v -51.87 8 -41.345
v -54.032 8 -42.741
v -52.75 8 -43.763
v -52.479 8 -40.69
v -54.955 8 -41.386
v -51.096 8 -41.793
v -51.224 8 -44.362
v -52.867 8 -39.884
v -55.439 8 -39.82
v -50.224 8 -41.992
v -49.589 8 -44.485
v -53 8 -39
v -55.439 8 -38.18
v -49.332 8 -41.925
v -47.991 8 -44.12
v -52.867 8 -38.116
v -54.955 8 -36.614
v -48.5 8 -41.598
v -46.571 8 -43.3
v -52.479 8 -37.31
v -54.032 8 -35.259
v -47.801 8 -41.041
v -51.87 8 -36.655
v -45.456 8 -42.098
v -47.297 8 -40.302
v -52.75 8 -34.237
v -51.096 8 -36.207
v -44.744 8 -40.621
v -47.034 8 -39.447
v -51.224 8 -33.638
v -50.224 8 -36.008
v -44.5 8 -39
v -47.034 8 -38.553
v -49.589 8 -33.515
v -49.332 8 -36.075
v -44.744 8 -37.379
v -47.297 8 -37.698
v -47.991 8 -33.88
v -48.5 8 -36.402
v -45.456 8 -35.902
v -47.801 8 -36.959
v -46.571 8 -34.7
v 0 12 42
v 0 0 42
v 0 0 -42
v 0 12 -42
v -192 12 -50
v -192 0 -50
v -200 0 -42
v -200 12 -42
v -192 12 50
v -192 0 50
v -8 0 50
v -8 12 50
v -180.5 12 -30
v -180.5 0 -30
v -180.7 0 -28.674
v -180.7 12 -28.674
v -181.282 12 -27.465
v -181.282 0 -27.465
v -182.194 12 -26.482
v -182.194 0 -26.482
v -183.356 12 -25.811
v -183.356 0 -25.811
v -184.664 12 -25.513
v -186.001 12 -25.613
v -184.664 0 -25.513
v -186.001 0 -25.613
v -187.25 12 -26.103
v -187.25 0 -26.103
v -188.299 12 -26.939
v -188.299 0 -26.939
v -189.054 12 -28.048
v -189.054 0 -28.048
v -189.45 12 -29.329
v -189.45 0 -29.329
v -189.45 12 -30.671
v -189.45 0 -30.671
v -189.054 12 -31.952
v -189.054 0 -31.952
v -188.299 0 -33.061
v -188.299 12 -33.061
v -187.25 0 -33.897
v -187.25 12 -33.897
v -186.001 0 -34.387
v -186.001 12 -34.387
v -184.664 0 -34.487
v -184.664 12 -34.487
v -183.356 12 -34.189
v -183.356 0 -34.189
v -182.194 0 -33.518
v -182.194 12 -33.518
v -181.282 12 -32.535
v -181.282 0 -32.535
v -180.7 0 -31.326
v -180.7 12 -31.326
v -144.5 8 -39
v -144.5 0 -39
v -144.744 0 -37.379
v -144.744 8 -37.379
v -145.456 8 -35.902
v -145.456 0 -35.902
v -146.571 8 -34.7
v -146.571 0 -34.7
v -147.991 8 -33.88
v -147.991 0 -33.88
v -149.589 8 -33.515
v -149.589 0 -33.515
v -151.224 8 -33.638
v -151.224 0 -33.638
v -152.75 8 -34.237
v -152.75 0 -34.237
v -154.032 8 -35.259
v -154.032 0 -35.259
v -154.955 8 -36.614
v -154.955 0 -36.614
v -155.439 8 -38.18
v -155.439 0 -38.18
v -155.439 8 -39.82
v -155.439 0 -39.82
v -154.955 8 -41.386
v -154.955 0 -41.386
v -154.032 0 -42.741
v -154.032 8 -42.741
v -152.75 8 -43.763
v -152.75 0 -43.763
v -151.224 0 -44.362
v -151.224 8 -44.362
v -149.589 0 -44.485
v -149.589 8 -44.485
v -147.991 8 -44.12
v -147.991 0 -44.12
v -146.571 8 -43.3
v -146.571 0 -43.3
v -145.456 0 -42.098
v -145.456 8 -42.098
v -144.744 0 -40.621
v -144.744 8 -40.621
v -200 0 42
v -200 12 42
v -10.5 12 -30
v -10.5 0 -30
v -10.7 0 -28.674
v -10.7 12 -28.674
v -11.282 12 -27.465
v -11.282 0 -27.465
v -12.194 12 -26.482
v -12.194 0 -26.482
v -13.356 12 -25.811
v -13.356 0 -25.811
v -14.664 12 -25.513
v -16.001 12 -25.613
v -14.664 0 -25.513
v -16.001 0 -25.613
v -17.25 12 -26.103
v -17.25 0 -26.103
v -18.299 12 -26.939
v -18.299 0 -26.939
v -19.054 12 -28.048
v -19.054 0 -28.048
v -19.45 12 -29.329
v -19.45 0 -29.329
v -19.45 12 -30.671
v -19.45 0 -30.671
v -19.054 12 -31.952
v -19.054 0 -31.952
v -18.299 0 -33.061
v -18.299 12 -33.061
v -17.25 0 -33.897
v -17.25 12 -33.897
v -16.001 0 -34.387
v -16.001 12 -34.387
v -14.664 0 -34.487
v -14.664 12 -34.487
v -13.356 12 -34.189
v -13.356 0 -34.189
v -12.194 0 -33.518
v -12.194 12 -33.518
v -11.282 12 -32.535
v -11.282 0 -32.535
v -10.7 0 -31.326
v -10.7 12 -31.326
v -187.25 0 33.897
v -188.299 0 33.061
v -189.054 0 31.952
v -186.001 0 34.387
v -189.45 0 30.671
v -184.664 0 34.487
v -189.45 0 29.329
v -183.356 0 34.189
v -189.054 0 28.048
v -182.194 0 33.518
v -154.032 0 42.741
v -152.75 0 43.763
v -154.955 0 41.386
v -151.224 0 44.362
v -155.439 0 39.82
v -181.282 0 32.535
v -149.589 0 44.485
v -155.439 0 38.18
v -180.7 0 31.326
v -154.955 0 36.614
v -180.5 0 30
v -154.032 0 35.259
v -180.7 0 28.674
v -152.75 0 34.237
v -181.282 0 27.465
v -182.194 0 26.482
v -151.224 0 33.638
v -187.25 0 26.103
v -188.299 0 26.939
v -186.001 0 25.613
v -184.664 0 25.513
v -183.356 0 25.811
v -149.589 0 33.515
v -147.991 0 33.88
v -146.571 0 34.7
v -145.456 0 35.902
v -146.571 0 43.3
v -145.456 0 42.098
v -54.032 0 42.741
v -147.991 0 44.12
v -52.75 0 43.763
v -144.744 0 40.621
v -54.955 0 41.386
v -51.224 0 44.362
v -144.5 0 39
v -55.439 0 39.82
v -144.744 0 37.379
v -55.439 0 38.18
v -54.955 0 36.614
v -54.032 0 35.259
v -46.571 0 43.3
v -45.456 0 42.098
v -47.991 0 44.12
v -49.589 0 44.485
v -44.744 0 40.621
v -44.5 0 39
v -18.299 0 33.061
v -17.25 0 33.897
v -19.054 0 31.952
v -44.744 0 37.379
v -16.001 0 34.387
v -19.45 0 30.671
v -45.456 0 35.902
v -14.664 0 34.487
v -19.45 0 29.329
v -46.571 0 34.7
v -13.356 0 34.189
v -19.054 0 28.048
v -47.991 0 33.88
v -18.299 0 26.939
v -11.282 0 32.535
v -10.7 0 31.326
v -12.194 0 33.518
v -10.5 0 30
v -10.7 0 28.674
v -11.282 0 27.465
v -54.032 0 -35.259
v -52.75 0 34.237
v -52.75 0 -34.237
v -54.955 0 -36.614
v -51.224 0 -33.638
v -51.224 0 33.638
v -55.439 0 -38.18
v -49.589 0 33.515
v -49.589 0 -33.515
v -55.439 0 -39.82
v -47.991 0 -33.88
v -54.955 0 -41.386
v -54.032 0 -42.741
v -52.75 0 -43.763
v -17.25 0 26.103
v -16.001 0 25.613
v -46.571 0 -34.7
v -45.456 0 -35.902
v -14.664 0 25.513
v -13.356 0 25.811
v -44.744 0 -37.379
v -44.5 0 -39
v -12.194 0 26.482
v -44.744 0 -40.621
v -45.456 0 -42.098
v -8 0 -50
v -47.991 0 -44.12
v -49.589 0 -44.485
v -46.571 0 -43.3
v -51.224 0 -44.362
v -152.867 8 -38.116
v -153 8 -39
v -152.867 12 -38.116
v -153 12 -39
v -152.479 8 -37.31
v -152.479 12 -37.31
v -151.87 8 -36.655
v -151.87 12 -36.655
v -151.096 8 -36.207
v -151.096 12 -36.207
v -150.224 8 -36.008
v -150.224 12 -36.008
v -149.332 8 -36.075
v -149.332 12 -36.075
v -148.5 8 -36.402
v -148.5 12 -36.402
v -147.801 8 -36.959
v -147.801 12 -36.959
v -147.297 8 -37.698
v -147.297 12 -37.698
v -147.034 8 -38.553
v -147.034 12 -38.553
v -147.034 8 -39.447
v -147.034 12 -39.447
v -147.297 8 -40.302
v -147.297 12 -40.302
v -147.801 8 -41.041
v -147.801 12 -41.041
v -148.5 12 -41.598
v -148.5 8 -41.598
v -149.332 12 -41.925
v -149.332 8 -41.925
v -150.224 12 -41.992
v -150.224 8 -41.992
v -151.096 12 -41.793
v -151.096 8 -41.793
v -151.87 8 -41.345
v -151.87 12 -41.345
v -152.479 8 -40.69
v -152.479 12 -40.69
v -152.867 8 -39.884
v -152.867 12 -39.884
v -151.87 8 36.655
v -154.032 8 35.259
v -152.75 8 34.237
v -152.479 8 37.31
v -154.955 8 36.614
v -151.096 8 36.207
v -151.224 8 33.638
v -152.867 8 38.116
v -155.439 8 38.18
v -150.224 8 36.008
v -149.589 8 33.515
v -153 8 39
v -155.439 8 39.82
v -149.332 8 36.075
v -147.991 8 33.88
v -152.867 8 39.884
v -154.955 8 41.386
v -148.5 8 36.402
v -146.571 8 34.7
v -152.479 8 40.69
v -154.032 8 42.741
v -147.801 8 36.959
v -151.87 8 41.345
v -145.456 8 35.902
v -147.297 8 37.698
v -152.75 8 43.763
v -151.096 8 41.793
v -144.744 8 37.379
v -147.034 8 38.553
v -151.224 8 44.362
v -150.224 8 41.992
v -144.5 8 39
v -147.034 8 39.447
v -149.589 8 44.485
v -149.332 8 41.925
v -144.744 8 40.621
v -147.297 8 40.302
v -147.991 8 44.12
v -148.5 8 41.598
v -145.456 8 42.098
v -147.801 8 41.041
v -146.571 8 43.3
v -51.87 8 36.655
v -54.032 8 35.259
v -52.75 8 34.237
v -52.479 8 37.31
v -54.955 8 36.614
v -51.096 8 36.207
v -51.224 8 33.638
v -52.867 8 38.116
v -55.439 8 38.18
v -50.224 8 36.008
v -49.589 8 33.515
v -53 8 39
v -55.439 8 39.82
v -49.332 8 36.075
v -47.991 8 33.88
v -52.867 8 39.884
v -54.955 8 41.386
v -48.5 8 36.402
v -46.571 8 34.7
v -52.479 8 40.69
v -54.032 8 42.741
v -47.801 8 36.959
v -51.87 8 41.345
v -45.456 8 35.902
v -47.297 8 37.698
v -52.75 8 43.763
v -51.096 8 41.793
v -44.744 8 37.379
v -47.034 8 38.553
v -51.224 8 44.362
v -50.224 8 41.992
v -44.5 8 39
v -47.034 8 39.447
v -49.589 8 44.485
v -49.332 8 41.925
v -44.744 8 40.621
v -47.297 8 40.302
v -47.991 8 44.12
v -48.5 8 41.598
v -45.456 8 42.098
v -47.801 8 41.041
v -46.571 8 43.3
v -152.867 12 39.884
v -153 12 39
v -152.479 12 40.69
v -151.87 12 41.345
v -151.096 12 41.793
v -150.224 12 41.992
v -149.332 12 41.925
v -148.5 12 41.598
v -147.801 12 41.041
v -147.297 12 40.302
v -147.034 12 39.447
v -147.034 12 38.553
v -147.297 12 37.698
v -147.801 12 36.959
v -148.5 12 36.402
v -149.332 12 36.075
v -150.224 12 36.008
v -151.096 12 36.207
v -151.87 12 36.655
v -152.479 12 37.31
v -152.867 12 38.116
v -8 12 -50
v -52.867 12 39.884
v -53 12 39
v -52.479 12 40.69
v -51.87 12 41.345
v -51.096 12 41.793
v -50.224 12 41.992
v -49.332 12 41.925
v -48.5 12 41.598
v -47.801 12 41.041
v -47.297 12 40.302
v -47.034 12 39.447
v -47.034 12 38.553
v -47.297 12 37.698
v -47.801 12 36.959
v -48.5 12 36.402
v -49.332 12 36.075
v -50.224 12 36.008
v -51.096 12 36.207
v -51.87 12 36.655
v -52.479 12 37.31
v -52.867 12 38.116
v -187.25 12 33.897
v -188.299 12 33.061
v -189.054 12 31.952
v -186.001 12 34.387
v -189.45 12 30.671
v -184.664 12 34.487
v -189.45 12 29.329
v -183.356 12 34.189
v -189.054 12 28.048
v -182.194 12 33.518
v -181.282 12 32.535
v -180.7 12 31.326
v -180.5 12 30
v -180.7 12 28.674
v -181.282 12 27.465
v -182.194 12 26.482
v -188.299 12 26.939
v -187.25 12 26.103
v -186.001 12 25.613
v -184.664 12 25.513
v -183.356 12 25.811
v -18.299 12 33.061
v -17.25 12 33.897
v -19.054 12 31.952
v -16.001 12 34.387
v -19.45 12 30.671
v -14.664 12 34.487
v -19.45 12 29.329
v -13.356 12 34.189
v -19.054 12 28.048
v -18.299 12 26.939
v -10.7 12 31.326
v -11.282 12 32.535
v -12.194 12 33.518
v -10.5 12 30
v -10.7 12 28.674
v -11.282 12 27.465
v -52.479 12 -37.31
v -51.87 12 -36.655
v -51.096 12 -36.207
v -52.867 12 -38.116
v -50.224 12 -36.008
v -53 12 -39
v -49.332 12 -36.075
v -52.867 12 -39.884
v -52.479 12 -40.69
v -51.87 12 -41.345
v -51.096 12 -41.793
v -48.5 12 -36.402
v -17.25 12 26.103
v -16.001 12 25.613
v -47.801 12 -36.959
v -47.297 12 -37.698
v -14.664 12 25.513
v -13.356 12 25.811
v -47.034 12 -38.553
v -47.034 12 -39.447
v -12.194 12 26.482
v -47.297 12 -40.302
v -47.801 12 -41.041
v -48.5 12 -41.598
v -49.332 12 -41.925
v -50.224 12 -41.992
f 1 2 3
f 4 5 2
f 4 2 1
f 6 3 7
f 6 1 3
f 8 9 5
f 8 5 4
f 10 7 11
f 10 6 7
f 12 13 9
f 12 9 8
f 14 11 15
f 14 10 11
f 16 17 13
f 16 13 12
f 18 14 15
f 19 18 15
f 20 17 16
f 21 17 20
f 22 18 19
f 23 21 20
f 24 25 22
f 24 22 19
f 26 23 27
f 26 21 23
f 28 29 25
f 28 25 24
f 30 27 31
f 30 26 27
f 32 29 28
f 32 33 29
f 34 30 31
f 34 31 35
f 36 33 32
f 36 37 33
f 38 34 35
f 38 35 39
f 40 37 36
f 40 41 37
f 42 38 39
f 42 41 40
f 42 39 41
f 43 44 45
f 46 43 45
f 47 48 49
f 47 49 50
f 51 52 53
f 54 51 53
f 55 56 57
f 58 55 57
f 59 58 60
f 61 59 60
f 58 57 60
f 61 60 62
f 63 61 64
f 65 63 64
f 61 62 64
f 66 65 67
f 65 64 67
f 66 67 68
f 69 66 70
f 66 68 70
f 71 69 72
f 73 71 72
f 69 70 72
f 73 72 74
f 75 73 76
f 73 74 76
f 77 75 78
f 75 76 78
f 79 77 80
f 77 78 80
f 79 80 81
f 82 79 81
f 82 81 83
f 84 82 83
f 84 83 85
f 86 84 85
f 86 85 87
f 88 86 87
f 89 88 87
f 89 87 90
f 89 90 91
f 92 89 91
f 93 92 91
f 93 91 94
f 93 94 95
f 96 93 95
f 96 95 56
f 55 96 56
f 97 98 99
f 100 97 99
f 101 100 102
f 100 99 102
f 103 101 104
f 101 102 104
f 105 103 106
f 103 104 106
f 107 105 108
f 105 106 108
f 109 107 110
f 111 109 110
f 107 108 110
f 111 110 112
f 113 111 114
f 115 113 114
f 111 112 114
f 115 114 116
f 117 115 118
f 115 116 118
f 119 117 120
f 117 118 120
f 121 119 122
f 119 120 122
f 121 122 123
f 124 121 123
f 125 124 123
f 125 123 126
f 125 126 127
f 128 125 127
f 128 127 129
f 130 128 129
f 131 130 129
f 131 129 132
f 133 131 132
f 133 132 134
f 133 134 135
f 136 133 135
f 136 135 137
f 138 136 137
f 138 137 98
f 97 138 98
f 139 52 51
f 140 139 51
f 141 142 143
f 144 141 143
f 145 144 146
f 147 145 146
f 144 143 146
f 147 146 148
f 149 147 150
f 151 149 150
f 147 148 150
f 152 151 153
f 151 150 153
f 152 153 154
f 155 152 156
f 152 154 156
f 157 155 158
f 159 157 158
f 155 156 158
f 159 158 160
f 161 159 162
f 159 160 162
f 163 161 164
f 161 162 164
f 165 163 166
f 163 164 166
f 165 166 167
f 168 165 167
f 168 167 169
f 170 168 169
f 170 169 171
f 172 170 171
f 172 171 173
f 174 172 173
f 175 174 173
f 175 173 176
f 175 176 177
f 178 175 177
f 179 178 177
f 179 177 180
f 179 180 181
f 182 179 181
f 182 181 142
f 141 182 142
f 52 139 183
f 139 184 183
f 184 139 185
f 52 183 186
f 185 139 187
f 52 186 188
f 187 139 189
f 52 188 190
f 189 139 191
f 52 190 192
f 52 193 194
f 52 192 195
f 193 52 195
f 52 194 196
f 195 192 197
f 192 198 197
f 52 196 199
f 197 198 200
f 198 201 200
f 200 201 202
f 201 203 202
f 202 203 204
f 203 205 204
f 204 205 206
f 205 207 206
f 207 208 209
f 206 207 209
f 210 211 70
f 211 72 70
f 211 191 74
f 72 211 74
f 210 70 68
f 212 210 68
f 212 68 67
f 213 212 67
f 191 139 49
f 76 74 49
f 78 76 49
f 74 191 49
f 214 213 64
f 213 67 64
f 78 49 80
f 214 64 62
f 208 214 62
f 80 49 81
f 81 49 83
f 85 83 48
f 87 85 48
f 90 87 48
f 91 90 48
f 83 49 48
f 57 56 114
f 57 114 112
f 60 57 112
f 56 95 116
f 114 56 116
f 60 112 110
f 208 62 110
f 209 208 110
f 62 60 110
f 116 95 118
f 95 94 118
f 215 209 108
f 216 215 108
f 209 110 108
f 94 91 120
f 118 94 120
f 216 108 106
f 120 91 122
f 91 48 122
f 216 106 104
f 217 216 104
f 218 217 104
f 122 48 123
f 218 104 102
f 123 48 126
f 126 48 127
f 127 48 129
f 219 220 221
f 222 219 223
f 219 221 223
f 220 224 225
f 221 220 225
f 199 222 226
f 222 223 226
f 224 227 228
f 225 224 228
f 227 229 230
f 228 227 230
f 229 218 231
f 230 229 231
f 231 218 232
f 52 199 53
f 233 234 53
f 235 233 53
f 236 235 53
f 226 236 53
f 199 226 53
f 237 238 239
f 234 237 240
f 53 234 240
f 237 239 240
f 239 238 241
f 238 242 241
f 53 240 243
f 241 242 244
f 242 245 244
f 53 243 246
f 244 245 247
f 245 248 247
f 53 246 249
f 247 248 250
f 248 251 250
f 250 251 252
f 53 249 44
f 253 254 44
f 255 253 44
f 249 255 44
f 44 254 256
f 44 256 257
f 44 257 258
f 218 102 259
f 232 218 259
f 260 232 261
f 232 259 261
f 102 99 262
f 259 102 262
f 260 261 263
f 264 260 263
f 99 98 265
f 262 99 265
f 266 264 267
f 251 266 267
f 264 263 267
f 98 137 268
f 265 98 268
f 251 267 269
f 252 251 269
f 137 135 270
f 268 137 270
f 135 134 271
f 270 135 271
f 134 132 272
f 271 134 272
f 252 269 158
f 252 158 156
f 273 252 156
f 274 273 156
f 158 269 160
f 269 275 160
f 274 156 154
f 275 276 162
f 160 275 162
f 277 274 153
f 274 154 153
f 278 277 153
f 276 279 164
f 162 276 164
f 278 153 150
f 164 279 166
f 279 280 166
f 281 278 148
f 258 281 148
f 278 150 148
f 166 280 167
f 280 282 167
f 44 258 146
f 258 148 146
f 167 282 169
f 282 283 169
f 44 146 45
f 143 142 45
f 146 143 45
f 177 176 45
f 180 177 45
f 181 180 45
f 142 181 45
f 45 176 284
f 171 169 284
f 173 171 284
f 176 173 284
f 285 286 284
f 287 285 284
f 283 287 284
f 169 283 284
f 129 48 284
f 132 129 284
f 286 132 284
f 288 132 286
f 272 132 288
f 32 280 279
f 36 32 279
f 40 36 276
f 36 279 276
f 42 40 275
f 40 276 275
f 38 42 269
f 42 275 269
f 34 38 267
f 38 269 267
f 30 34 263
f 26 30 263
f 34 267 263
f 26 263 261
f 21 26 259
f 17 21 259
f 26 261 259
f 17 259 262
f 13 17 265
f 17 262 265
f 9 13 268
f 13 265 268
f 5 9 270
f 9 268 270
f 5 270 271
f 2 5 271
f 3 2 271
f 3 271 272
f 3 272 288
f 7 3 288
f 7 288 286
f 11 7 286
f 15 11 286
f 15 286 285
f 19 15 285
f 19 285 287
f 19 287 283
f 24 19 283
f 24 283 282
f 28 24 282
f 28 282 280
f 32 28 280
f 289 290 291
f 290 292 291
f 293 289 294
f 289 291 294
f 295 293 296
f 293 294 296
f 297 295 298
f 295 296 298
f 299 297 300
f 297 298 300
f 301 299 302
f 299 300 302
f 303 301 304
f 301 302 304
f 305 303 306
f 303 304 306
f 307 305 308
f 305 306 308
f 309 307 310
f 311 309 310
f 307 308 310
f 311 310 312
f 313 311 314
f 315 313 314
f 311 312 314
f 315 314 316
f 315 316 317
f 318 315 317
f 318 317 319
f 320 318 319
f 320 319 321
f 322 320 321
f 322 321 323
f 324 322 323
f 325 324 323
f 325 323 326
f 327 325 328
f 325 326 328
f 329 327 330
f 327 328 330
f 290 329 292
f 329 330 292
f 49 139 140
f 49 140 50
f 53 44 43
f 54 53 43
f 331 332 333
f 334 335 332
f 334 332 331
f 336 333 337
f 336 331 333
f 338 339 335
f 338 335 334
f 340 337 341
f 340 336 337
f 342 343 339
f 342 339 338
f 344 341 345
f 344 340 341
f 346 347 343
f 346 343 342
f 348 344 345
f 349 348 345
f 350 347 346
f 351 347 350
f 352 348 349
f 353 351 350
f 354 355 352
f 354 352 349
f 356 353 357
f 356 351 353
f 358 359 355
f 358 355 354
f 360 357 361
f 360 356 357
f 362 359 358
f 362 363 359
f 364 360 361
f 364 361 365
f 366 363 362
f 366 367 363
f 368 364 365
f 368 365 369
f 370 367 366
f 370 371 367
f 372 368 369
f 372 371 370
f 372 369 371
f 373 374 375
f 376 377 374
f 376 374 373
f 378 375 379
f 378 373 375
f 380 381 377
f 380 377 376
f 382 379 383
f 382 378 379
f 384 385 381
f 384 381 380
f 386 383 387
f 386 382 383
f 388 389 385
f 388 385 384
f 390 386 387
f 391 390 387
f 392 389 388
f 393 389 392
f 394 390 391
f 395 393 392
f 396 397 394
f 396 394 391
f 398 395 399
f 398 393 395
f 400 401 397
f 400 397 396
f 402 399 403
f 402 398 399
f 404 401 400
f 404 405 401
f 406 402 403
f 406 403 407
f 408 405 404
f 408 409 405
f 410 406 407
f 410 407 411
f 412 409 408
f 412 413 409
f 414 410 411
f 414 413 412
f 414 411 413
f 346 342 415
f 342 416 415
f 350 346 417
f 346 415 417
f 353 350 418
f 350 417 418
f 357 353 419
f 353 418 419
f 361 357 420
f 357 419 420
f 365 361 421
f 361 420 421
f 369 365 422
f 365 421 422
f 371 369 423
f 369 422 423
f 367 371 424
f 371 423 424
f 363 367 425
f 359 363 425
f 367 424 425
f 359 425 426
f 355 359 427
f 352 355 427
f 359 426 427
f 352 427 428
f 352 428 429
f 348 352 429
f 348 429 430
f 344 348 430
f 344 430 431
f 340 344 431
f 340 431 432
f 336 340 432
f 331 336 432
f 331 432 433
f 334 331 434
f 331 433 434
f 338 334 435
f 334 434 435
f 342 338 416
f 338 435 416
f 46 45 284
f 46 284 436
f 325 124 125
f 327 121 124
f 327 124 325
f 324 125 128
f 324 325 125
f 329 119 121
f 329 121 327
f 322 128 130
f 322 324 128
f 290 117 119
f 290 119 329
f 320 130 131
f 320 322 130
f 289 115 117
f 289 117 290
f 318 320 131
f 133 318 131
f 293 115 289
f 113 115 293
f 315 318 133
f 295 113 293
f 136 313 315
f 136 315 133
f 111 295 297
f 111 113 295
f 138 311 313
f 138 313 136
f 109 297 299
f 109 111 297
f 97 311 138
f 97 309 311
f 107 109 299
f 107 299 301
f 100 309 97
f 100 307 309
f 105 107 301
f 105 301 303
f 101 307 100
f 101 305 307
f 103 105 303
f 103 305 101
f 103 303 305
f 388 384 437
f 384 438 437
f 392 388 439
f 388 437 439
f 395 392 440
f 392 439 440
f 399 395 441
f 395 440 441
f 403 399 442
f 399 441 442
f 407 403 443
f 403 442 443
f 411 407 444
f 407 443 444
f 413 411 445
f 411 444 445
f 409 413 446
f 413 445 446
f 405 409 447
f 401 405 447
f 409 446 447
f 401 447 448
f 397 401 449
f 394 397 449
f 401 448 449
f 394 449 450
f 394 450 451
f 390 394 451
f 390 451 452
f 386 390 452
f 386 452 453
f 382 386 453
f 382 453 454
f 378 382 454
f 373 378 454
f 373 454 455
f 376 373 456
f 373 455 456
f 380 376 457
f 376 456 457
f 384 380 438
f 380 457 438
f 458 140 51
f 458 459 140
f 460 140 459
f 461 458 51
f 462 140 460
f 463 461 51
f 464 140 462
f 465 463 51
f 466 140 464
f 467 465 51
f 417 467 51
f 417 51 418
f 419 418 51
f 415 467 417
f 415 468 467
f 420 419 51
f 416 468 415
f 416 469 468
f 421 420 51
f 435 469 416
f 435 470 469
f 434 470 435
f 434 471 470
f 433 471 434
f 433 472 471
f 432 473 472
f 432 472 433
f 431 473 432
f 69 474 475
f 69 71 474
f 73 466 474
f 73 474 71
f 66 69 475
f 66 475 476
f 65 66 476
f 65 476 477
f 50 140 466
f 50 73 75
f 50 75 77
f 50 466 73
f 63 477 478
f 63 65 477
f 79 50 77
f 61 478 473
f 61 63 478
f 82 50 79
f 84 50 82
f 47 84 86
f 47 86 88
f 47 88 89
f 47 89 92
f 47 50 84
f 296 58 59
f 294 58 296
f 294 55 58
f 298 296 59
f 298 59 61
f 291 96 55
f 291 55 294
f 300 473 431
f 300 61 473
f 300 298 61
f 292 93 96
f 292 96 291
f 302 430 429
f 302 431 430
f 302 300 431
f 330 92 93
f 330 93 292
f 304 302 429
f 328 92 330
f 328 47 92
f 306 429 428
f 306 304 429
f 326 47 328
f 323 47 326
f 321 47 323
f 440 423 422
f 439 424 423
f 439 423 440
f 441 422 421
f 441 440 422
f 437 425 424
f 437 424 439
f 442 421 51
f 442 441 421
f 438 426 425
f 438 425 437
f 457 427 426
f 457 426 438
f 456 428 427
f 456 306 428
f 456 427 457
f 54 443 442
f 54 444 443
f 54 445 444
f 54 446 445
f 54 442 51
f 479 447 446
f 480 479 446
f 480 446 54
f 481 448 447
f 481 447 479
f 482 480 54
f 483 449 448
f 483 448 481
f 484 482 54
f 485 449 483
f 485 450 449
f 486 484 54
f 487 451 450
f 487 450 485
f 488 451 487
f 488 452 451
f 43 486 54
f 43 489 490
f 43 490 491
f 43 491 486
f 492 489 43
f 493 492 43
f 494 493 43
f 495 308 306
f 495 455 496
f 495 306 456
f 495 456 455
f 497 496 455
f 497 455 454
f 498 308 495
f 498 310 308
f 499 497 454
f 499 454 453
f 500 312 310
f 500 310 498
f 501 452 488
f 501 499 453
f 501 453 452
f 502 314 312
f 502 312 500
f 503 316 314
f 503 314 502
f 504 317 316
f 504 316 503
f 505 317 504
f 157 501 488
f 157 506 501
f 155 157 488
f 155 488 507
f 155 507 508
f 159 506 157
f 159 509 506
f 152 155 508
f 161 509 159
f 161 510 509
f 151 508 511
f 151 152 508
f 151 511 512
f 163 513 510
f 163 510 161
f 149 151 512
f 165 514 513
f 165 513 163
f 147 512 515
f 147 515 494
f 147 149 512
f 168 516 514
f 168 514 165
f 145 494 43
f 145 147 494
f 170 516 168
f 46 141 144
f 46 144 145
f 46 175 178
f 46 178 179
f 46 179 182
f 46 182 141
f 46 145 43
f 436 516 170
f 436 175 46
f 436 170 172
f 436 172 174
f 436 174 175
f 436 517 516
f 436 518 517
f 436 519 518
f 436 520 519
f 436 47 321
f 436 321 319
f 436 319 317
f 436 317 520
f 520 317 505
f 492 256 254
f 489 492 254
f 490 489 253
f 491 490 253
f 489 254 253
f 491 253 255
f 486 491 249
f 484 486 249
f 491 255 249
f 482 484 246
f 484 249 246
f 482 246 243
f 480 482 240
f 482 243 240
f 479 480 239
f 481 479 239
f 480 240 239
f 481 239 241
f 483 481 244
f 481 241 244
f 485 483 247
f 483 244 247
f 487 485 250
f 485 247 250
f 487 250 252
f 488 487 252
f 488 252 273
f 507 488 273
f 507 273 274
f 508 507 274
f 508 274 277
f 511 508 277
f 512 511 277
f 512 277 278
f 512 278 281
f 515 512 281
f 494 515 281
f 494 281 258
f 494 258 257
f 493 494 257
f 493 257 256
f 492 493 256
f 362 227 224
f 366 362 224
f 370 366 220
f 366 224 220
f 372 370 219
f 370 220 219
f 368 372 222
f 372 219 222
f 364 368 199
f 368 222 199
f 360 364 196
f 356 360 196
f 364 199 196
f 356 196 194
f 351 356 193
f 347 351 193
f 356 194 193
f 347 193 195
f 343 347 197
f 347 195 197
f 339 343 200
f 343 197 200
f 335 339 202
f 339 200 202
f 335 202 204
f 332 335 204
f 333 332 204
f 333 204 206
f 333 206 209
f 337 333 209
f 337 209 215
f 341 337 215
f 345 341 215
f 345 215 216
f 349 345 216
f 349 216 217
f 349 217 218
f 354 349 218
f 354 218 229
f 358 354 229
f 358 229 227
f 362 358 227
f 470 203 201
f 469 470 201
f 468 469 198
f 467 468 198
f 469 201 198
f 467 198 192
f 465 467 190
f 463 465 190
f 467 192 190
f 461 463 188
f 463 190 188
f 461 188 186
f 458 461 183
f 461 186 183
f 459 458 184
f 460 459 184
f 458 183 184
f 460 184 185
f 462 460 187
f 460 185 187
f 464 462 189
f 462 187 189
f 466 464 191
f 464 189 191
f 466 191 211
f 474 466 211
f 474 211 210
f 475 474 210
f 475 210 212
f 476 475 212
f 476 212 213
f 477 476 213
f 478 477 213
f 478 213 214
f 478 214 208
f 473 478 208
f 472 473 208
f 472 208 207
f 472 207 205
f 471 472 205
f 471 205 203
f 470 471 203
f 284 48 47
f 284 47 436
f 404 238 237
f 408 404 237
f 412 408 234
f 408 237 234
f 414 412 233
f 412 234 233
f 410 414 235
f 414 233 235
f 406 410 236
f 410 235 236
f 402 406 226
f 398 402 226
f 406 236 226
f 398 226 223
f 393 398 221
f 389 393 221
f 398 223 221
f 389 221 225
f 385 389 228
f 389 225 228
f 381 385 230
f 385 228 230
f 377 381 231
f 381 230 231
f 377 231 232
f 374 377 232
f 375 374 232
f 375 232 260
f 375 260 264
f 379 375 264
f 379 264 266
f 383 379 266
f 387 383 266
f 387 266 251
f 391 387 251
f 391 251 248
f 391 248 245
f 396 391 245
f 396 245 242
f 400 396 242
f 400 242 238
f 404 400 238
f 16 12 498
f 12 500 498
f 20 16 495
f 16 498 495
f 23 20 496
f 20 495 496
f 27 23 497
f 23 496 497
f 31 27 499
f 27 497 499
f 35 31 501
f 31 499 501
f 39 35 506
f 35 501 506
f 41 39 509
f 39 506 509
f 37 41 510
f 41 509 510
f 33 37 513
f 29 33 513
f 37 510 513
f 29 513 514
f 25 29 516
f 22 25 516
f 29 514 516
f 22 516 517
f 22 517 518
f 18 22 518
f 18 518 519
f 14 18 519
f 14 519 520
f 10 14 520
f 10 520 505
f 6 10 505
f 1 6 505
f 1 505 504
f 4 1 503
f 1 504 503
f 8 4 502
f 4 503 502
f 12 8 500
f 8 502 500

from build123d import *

# Parameters (mm, degrees)
SKETCH1_W                                       = 200
SKETCH1_H                                       = 100
BOSS_EXTRUDE1_DEPTH                             = 12
F_9_0_9_DIAMETER_HOLE1_D                        = 9
CBORE_FOR_M5_SOCKET_HEAD_CAP_SCREW1_D           = 6
CBORE_FOR_M5_SOCKET_HEAD_CAP_SCREW1_CBORE_D     = 11
CBORE_FOR_M5_SOCKET_HEAD_CAP_SCREW1_CBORE_DEPTH = 8
CHAMFER1_SIZE                                   = 8


with BuildPart() as part:
    # Sketch1 → Boss-Extrude1 (new body)
    with BuildSketch(Plane(origin=(0, 0, 0), x_dir=(1, 0, 0), z_dir=(0, 1, 0))):
        with Locations((-100, 0)):
            Rectangle(SKETCH1_W, SKETCH1_H)
    extrude(amount=BOSS_EXTRUDE1_DEPTH)

    # Ø9.0 (9) Diameter Hole1 (through all)
    with Locations(Plane(origin=(0, 12, 0), x_dir=(-1, 0, 0), z_dir=(0, 1, 0))):
        with Locations((185, 30), (15, 30), (15, -30), (185, -30)):
            Hole(F_9_0_9_DIAMETER_HOLE1_D / 2)

    # CBORE for M5 Socket Head Cap Screw1 (through all)
    with Locations(Plane.XZ):
        with Locations((-150, 39), (-50, 39), (-150, -39), (-50, -39)):
            CounterBoreHole(CBORE_FOR_M5_SOCKET_HEAD_CAP_SCREW1_D / 2, CBORE_FOR_M5_SOCKET_HEAD_CAP_SCREW1_CBORE_D / 2, CBORE_FOR_M5_SOCKET_HEAD_CAP_SCREW1_CBORE_DEPTH)

    # Chamfer1
    chamfer1_edges = [part.edges().sort_by_distance(p)[0] for p in [
        (-200, 6, -50),
        (0, 6, -50),
        (0, 6, 50),
        (-200, 6, 50),
    ]]
    chamfer(chamfer1_edges, length=CHAMFER1_SIZE)


solid = part.part
